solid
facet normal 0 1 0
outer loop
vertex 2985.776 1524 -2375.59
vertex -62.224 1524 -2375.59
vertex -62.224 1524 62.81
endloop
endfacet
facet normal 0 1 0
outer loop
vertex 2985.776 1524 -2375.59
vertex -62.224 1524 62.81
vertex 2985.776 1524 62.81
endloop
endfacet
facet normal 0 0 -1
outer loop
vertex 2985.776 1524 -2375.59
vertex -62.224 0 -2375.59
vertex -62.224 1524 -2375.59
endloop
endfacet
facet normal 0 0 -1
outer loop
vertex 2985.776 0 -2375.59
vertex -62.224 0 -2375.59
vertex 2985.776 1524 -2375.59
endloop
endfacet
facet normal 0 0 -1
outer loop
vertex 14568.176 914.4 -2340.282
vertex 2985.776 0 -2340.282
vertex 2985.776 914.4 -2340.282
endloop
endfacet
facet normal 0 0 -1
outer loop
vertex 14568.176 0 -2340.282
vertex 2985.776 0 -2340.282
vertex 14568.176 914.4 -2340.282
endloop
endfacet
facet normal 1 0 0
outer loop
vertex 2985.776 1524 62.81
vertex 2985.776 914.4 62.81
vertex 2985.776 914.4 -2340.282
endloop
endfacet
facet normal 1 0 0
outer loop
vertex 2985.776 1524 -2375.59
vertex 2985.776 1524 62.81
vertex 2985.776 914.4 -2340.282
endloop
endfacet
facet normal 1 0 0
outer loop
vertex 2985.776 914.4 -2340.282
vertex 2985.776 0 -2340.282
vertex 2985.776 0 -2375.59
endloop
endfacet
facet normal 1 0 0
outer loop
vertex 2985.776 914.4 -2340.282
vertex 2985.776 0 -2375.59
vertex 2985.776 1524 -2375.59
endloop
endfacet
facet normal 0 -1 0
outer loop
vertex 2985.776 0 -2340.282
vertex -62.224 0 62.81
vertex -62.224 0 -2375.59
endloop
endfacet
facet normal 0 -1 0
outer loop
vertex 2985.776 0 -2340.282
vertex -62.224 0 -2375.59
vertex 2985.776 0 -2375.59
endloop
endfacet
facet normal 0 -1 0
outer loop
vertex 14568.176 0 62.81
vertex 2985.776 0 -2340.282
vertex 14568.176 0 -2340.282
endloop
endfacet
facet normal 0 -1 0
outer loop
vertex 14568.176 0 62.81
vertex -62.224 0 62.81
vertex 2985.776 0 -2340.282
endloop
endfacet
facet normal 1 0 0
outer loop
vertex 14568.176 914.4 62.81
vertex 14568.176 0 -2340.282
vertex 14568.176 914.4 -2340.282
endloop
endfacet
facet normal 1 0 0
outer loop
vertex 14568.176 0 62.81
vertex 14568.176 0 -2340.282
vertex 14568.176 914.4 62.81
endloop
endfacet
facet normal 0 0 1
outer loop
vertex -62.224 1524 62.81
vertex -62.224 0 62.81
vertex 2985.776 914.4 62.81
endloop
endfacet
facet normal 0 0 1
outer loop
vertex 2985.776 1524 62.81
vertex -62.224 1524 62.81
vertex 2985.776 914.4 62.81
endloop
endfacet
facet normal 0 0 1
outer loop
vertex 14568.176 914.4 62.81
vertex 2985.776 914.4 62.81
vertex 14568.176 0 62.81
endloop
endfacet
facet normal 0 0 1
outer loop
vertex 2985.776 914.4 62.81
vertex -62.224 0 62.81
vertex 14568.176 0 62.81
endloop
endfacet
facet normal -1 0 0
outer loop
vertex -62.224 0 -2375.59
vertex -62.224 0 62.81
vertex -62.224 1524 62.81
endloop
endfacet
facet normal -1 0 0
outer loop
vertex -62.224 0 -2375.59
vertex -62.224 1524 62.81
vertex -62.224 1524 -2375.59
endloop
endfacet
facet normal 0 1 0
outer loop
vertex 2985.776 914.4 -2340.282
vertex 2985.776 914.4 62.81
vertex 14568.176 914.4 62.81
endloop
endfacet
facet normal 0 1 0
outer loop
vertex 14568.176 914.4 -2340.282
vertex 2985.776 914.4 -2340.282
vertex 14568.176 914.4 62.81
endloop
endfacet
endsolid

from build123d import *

# Parameters (mm, degrees)
SKETCH1_W           = 3048
SKETCH1_H           = 2438.4
BOSS_EXTRUDE1_DEPTH = 1524
SKETCH3_W           = 11582.4
SKETCH3_H           = 2403.091922187
BOSS_EXTRUDE2_DEPTH = 914.4


with BuildPart() as part:
    # Sketch1 → Boss-Extrude1 (new body)
    with BuildSketch(Plane(origin=(0, 0, 0), x_dir=(1, 0, 0), z_dir=(0, 1, 0))):
        with Locations((1461.775569056, 1156.389927353)):
            Rectangle(SKETCH1_W, SKETCH1_H)
    extrude(amount=BOSS_EXTRUDE1_DEPTH)

    # Sketch3 → Boss-Extrude2 (add)
    with BuildSketch(Plane.XZ):
        with Locations((8776.975569056, -1138.735888446)):
            Rectangle(SKETCH3_W, SKETCH3_H)
    extrude(amount=-BOSS_EXTRUDE2_DEPTH)


solid = part.part
